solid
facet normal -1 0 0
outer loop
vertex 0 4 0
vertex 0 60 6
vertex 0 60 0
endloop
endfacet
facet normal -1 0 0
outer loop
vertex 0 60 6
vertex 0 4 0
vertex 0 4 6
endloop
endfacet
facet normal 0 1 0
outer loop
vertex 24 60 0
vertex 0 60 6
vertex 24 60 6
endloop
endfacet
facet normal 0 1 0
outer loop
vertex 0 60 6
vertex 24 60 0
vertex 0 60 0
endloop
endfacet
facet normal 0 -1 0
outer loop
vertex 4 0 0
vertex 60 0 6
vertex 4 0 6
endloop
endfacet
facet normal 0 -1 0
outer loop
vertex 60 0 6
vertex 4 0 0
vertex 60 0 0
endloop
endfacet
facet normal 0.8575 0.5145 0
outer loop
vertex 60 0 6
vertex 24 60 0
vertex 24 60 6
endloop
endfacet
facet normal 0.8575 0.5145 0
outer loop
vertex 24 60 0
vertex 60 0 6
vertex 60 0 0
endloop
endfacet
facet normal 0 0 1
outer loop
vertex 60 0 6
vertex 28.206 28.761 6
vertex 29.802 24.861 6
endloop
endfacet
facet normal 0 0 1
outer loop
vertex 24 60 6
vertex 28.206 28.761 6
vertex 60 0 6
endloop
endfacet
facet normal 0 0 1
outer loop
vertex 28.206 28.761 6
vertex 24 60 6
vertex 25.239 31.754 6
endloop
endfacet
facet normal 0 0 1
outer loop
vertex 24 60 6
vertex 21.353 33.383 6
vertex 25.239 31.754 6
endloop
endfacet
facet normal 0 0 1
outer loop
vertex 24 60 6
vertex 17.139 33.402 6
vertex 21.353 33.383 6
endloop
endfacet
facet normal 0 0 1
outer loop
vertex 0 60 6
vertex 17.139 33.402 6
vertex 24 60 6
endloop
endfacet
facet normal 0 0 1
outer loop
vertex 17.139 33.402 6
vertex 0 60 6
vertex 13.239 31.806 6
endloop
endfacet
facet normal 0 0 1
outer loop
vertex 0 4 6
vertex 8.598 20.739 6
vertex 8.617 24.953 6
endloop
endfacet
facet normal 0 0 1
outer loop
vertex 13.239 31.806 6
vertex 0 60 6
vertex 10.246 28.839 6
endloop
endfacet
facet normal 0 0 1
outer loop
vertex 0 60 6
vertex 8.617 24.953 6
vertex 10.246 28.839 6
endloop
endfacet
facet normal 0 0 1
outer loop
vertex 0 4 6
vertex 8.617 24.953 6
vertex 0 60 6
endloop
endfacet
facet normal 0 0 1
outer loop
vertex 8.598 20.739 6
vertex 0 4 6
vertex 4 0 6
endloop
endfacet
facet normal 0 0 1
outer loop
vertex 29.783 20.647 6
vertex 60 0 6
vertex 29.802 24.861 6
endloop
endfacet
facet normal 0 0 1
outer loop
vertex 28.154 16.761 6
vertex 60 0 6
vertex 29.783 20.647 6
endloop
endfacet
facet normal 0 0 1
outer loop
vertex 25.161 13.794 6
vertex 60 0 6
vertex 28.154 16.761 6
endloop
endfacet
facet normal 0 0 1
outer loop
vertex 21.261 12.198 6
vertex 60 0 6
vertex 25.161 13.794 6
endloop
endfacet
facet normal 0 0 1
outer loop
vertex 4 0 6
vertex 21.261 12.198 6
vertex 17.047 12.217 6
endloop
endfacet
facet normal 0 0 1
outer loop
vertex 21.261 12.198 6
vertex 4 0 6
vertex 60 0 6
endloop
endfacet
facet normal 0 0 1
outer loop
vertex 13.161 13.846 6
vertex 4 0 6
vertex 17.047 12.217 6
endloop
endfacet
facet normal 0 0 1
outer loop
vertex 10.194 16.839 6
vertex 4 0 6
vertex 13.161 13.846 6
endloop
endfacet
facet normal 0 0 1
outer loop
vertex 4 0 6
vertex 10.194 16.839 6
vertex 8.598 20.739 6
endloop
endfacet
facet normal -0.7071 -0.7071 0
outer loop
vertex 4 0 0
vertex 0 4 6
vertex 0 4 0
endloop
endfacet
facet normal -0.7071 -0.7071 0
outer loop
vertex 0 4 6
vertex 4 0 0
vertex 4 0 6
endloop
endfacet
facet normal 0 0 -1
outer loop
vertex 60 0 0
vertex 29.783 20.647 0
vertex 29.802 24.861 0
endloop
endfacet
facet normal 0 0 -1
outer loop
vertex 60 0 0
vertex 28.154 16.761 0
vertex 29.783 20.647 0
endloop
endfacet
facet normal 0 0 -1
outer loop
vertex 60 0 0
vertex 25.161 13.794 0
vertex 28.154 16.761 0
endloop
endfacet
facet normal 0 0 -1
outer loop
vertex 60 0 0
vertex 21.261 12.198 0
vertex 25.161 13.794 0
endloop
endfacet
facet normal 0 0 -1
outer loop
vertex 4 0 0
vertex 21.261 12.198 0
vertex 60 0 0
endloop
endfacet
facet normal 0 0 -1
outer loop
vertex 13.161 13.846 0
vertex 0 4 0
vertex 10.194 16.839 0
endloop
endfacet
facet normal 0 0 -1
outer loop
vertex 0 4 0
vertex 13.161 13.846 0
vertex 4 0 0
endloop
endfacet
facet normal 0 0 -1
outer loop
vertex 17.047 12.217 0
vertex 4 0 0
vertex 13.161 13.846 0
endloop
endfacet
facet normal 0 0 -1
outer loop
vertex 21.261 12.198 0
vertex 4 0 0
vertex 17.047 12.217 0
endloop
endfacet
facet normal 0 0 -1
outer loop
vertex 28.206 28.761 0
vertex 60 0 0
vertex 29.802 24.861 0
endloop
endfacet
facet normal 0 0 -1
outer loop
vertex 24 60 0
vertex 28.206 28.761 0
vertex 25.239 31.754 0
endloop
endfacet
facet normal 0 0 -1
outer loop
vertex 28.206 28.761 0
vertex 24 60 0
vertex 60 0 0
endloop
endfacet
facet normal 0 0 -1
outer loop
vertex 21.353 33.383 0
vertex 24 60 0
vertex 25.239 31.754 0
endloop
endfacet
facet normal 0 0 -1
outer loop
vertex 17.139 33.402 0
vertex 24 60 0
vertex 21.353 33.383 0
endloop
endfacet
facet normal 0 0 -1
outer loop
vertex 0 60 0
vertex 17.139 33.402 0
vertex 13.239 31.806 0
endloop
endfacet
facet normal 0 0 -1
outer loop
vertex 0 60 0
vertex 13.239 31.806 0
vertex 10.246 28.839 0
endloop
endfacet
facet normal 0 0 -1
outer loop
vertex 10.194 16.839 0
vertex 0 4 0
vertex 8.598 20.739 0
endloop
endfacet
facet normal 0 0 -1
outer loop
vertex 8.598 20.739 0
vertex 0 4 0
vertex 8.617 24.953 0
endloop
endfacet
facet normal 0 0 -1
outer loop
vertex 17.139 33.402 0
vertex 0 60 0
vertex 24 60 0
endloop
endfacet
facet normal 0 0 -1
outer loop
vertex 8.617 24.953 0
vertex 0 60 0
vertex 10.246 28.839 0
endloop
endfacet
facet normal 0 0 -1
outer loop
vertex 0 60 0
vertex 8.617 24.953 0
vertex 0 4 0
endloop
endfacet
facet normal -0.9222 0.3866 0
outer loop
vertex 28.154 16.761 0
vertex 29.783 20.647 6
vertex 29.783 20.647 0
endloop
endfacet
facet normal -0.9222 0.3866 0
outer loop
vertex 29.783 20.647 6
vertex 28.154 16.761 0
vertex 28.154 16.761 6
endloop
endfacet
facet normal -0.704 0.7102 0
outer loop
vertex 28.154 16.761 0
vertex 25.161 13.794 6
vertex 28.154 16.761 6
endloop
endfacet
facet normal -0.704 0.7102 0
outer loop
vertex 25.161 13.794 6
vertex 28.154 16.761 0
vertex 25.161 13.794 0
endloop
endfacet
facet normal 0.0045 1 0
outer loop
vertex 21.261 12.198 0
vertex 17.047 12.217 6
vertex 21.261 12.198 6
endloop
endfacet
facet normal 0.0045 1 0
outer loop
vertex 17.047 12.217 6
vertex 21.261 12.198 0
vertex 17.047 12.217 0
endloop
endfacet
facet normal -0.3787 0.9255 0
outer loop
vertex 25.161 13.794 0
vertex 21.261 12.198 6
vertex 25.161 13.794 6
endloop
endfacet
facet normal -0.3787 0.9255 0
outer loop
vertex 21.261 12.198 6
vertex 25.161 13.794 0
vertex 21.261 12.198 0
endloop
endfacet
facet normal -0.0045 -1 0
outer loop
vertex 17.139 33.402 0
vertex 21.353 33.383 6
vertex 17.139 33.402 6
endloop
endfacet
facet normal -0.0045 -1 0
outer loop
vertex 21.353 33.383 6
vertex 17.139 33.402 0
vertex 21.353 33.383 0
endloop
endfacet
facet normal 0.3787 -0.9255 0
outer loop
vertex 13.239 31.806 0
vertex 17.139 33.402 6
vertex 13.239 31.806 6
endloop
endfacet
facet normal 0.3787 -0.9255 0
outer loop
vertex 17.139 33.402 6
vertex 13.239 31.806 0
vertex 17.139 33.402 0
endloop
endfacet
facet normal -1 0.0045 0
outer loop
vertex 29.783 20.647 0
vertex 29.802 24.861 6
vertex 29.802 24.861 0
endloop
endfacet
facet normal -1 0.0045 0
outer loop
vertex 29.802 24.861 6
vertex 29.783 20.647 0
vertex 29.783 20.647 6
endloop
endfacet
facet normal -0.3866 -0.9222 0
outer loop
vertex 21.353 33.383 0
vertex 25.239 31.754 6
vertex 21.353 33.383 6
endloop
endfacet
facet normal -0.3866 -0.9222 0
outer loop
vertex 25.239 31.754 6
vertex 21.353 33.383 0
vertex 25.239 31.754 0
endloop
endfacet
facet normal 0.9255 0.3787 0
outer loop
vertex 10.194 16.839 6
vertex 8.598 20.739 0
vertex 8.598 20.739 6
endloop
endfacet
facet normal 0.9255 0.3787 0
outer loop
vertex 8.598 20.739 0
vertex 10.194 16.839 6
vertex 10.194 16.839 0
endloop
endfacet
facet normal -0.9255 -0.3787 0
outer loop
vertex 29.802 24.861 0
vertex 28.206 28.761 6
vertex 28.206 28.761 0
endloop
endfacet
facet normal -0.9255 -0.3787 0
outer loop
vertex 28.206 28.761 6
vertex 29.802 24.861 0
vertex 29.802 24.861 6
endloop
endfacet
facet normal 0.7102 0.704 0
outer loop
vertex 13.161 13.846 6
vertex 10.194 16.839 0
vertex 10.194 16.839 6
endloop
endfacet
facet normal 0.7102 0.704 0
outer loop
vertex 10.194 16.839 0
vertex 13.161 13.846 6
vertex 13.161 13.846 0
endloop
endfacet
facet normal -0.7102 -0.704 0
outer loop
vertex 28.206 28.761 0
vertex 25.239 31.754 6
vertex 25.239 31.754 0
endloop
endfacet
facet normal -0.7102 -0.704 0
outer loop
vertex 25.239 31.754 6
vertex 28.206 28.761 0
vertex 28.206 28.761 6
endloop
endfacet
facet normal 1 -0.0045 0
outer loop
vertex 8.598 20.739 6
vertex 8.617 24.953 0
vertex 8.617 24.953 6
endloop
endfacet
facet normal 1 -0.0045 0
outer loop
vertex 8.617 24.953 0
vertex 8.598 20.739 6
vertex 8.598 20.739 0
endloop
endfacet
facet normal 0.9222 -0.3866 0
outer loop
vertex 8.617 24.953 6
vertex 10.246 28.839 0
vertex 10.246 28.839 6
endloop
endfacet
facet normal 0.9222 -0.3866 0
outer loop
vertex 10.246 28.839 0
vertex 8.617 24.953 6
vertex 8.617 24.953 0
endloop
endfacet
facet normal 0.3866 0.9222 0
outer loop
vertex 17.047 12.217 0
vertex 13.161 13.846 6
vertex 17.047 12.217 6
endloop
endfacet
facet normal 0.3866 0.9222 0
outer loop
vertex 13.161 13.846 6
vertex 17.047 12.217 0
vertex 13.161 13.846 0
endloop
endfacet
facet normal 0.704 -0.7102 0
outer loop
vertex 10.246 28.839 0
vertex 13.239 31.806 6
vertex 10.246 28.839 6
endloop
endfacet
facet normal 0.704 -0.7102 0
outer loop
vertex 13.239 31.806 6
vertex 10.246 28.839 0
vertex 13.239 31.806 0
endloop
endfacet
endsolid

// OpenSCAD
$fn = 32;

// ----------------------------------------------------------------------
// Bracket plate: gusset 60 x 60
// ----------------------------------------------------------------------

// --- parameters (mm) ---
hole_r = 3;               // bolt hole radius
plate_t = 6;              // plate thickness, Z (extrusion height)
gus_a = 60;               // base length
gus_b = 60;               // height
top_x = 24;               // top edge X of the angled cut
light_r = 10.8;           // lightening hole radius
fit_tol = 0.1;            // declared fit tolerance (prompt contract)
free_tol = 0.5;           // declared free tolerance (prompt contract)

light_d = 2 * light_r;

profile = [[4, 0], [30, 0], [60, 0], [24, 60], [0, 60], [0, 4]];  // primary outline, 6 points, counter clockwise
void_1 = [[29.802, 24.861], [28.206, 28.761], [25.239, 31.754], [21.353, 33.383], [17.139, 33.402], [13.239, 31.806], [10.246, 28.839], [8.617, 24.953], [8.598, 20.739], [10.194, 16.839], [13.161, 13.846], [17.047, 12.217], [21.261, 12.198], [25.161, 13.794], [28.154, 16.761], [29.783, 20.647]];  // lightening hole, 16 points

// --- the one profile operation ---
difference() {
  linear_extrude(height = plate_t) polygon(points = profile);
  translate([0, 0, -1])
    linear_extrude(height = plate_t + 2) polygon(points = void_1);
}
